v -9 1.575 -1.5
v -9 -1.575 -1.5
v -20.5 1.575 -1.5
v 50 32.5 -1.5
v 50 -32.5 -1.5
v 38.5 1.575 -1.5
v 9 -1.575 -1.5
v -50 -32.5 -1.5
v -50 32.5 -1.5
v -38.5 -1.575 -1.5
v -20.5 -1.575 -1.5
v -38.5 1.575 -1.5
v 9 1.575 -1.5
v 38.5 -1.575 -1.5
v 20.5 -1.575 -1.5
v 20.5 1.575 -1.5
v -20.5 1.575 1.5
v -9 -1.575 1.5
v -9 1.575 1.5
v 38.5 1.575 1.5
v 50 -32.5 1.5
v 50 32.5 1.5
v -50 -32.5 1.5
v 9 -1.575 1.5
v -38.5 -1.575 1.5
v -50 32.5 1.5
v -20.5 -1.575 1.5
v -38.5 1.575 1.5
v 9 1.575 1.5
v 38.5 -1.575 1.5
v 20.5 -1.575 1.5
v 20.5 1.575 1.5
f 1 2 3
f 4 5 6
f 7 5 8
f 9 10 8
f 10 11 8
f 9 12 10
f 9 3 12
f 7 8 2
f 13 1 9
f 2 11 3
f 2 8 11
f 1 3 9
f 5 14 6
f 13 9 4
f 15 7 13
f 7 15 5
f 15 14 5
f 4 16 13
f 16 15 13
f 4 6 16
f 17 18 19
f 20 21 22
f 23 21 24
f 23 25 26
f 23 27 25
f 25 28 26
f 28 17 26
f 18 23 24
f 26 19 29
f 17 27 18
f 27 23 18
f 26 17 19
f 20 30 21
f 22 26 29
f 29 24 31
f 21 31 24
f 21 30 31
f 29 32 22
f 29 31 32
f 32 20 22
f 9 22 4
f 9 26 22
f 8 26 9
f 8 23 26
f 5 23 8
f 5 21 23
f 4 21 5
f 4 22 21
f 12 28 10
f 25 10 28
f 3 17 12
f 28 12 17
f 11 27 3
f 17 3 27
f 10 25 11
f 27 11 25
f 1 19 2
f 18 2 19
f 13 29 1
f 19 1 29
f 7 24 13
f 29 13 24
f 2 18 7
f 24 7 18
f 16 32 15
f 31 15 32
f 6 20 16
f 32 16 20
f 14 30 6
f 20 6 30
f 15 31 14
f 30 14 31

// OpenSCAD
// Makerbench Laser 2D Cut Panel Design
// Finished profile: 100 x 65 mm, thickness: 3.0 mm
// 3 centered horizontal slots: 18 x 3.15 mm

panel_width = 100.0;
panel_height = 65.0;
panel_thickness = 3.0;

slot_count = 3;
slot_length = 18.0;
slot_width = 3.15;
laser_kerf = 0.2;

// Calculations for spacing and validation
total_slots_length = slot_count * slot_length;
remaining_width = panel_width - total_slots_length;
web_x = remaining_width / (slot_count + 1);
web_y = (panel_height - slot_width) / 2.0;
min_web = min(web_x, web_y);

// Manifest Echo for manufacturing metadata
echo(str("MAKERBENCH-LASER2D: {",
    "\"material_thickness_mm\": ", panel_thickness, ", ",
    "\"kerf_mm\": ", laser_kerf, ", ",
    "\"slot_count\": ", slot_count, ", ",
    "\"slot_length_mm\": ", slot_length, ", ",
    "\"slot_width_mm\": ", slot_width, ", ",
    "\"min_web_mm\": ", min_web,
"}"));

// Final Solid Model (representing the finished cut part)
linear_extrude(height = panel_thickness, center = true) {
    difference() {
        // Outer Panel Profile
        square([panel_width, panel_height], center = true);
        
        // Centered Horizontal Row of Slots
        for (i = [0 : slot_count - 1]) {
            x_pos = -panel_width / 2.0 + web_x + slot_length / 2.0 + i * (slot_length + web_x);
            translate([x_pos, 0]) {
                square([slot_length, slot_width], center = true);
            }
        }
    }
}
